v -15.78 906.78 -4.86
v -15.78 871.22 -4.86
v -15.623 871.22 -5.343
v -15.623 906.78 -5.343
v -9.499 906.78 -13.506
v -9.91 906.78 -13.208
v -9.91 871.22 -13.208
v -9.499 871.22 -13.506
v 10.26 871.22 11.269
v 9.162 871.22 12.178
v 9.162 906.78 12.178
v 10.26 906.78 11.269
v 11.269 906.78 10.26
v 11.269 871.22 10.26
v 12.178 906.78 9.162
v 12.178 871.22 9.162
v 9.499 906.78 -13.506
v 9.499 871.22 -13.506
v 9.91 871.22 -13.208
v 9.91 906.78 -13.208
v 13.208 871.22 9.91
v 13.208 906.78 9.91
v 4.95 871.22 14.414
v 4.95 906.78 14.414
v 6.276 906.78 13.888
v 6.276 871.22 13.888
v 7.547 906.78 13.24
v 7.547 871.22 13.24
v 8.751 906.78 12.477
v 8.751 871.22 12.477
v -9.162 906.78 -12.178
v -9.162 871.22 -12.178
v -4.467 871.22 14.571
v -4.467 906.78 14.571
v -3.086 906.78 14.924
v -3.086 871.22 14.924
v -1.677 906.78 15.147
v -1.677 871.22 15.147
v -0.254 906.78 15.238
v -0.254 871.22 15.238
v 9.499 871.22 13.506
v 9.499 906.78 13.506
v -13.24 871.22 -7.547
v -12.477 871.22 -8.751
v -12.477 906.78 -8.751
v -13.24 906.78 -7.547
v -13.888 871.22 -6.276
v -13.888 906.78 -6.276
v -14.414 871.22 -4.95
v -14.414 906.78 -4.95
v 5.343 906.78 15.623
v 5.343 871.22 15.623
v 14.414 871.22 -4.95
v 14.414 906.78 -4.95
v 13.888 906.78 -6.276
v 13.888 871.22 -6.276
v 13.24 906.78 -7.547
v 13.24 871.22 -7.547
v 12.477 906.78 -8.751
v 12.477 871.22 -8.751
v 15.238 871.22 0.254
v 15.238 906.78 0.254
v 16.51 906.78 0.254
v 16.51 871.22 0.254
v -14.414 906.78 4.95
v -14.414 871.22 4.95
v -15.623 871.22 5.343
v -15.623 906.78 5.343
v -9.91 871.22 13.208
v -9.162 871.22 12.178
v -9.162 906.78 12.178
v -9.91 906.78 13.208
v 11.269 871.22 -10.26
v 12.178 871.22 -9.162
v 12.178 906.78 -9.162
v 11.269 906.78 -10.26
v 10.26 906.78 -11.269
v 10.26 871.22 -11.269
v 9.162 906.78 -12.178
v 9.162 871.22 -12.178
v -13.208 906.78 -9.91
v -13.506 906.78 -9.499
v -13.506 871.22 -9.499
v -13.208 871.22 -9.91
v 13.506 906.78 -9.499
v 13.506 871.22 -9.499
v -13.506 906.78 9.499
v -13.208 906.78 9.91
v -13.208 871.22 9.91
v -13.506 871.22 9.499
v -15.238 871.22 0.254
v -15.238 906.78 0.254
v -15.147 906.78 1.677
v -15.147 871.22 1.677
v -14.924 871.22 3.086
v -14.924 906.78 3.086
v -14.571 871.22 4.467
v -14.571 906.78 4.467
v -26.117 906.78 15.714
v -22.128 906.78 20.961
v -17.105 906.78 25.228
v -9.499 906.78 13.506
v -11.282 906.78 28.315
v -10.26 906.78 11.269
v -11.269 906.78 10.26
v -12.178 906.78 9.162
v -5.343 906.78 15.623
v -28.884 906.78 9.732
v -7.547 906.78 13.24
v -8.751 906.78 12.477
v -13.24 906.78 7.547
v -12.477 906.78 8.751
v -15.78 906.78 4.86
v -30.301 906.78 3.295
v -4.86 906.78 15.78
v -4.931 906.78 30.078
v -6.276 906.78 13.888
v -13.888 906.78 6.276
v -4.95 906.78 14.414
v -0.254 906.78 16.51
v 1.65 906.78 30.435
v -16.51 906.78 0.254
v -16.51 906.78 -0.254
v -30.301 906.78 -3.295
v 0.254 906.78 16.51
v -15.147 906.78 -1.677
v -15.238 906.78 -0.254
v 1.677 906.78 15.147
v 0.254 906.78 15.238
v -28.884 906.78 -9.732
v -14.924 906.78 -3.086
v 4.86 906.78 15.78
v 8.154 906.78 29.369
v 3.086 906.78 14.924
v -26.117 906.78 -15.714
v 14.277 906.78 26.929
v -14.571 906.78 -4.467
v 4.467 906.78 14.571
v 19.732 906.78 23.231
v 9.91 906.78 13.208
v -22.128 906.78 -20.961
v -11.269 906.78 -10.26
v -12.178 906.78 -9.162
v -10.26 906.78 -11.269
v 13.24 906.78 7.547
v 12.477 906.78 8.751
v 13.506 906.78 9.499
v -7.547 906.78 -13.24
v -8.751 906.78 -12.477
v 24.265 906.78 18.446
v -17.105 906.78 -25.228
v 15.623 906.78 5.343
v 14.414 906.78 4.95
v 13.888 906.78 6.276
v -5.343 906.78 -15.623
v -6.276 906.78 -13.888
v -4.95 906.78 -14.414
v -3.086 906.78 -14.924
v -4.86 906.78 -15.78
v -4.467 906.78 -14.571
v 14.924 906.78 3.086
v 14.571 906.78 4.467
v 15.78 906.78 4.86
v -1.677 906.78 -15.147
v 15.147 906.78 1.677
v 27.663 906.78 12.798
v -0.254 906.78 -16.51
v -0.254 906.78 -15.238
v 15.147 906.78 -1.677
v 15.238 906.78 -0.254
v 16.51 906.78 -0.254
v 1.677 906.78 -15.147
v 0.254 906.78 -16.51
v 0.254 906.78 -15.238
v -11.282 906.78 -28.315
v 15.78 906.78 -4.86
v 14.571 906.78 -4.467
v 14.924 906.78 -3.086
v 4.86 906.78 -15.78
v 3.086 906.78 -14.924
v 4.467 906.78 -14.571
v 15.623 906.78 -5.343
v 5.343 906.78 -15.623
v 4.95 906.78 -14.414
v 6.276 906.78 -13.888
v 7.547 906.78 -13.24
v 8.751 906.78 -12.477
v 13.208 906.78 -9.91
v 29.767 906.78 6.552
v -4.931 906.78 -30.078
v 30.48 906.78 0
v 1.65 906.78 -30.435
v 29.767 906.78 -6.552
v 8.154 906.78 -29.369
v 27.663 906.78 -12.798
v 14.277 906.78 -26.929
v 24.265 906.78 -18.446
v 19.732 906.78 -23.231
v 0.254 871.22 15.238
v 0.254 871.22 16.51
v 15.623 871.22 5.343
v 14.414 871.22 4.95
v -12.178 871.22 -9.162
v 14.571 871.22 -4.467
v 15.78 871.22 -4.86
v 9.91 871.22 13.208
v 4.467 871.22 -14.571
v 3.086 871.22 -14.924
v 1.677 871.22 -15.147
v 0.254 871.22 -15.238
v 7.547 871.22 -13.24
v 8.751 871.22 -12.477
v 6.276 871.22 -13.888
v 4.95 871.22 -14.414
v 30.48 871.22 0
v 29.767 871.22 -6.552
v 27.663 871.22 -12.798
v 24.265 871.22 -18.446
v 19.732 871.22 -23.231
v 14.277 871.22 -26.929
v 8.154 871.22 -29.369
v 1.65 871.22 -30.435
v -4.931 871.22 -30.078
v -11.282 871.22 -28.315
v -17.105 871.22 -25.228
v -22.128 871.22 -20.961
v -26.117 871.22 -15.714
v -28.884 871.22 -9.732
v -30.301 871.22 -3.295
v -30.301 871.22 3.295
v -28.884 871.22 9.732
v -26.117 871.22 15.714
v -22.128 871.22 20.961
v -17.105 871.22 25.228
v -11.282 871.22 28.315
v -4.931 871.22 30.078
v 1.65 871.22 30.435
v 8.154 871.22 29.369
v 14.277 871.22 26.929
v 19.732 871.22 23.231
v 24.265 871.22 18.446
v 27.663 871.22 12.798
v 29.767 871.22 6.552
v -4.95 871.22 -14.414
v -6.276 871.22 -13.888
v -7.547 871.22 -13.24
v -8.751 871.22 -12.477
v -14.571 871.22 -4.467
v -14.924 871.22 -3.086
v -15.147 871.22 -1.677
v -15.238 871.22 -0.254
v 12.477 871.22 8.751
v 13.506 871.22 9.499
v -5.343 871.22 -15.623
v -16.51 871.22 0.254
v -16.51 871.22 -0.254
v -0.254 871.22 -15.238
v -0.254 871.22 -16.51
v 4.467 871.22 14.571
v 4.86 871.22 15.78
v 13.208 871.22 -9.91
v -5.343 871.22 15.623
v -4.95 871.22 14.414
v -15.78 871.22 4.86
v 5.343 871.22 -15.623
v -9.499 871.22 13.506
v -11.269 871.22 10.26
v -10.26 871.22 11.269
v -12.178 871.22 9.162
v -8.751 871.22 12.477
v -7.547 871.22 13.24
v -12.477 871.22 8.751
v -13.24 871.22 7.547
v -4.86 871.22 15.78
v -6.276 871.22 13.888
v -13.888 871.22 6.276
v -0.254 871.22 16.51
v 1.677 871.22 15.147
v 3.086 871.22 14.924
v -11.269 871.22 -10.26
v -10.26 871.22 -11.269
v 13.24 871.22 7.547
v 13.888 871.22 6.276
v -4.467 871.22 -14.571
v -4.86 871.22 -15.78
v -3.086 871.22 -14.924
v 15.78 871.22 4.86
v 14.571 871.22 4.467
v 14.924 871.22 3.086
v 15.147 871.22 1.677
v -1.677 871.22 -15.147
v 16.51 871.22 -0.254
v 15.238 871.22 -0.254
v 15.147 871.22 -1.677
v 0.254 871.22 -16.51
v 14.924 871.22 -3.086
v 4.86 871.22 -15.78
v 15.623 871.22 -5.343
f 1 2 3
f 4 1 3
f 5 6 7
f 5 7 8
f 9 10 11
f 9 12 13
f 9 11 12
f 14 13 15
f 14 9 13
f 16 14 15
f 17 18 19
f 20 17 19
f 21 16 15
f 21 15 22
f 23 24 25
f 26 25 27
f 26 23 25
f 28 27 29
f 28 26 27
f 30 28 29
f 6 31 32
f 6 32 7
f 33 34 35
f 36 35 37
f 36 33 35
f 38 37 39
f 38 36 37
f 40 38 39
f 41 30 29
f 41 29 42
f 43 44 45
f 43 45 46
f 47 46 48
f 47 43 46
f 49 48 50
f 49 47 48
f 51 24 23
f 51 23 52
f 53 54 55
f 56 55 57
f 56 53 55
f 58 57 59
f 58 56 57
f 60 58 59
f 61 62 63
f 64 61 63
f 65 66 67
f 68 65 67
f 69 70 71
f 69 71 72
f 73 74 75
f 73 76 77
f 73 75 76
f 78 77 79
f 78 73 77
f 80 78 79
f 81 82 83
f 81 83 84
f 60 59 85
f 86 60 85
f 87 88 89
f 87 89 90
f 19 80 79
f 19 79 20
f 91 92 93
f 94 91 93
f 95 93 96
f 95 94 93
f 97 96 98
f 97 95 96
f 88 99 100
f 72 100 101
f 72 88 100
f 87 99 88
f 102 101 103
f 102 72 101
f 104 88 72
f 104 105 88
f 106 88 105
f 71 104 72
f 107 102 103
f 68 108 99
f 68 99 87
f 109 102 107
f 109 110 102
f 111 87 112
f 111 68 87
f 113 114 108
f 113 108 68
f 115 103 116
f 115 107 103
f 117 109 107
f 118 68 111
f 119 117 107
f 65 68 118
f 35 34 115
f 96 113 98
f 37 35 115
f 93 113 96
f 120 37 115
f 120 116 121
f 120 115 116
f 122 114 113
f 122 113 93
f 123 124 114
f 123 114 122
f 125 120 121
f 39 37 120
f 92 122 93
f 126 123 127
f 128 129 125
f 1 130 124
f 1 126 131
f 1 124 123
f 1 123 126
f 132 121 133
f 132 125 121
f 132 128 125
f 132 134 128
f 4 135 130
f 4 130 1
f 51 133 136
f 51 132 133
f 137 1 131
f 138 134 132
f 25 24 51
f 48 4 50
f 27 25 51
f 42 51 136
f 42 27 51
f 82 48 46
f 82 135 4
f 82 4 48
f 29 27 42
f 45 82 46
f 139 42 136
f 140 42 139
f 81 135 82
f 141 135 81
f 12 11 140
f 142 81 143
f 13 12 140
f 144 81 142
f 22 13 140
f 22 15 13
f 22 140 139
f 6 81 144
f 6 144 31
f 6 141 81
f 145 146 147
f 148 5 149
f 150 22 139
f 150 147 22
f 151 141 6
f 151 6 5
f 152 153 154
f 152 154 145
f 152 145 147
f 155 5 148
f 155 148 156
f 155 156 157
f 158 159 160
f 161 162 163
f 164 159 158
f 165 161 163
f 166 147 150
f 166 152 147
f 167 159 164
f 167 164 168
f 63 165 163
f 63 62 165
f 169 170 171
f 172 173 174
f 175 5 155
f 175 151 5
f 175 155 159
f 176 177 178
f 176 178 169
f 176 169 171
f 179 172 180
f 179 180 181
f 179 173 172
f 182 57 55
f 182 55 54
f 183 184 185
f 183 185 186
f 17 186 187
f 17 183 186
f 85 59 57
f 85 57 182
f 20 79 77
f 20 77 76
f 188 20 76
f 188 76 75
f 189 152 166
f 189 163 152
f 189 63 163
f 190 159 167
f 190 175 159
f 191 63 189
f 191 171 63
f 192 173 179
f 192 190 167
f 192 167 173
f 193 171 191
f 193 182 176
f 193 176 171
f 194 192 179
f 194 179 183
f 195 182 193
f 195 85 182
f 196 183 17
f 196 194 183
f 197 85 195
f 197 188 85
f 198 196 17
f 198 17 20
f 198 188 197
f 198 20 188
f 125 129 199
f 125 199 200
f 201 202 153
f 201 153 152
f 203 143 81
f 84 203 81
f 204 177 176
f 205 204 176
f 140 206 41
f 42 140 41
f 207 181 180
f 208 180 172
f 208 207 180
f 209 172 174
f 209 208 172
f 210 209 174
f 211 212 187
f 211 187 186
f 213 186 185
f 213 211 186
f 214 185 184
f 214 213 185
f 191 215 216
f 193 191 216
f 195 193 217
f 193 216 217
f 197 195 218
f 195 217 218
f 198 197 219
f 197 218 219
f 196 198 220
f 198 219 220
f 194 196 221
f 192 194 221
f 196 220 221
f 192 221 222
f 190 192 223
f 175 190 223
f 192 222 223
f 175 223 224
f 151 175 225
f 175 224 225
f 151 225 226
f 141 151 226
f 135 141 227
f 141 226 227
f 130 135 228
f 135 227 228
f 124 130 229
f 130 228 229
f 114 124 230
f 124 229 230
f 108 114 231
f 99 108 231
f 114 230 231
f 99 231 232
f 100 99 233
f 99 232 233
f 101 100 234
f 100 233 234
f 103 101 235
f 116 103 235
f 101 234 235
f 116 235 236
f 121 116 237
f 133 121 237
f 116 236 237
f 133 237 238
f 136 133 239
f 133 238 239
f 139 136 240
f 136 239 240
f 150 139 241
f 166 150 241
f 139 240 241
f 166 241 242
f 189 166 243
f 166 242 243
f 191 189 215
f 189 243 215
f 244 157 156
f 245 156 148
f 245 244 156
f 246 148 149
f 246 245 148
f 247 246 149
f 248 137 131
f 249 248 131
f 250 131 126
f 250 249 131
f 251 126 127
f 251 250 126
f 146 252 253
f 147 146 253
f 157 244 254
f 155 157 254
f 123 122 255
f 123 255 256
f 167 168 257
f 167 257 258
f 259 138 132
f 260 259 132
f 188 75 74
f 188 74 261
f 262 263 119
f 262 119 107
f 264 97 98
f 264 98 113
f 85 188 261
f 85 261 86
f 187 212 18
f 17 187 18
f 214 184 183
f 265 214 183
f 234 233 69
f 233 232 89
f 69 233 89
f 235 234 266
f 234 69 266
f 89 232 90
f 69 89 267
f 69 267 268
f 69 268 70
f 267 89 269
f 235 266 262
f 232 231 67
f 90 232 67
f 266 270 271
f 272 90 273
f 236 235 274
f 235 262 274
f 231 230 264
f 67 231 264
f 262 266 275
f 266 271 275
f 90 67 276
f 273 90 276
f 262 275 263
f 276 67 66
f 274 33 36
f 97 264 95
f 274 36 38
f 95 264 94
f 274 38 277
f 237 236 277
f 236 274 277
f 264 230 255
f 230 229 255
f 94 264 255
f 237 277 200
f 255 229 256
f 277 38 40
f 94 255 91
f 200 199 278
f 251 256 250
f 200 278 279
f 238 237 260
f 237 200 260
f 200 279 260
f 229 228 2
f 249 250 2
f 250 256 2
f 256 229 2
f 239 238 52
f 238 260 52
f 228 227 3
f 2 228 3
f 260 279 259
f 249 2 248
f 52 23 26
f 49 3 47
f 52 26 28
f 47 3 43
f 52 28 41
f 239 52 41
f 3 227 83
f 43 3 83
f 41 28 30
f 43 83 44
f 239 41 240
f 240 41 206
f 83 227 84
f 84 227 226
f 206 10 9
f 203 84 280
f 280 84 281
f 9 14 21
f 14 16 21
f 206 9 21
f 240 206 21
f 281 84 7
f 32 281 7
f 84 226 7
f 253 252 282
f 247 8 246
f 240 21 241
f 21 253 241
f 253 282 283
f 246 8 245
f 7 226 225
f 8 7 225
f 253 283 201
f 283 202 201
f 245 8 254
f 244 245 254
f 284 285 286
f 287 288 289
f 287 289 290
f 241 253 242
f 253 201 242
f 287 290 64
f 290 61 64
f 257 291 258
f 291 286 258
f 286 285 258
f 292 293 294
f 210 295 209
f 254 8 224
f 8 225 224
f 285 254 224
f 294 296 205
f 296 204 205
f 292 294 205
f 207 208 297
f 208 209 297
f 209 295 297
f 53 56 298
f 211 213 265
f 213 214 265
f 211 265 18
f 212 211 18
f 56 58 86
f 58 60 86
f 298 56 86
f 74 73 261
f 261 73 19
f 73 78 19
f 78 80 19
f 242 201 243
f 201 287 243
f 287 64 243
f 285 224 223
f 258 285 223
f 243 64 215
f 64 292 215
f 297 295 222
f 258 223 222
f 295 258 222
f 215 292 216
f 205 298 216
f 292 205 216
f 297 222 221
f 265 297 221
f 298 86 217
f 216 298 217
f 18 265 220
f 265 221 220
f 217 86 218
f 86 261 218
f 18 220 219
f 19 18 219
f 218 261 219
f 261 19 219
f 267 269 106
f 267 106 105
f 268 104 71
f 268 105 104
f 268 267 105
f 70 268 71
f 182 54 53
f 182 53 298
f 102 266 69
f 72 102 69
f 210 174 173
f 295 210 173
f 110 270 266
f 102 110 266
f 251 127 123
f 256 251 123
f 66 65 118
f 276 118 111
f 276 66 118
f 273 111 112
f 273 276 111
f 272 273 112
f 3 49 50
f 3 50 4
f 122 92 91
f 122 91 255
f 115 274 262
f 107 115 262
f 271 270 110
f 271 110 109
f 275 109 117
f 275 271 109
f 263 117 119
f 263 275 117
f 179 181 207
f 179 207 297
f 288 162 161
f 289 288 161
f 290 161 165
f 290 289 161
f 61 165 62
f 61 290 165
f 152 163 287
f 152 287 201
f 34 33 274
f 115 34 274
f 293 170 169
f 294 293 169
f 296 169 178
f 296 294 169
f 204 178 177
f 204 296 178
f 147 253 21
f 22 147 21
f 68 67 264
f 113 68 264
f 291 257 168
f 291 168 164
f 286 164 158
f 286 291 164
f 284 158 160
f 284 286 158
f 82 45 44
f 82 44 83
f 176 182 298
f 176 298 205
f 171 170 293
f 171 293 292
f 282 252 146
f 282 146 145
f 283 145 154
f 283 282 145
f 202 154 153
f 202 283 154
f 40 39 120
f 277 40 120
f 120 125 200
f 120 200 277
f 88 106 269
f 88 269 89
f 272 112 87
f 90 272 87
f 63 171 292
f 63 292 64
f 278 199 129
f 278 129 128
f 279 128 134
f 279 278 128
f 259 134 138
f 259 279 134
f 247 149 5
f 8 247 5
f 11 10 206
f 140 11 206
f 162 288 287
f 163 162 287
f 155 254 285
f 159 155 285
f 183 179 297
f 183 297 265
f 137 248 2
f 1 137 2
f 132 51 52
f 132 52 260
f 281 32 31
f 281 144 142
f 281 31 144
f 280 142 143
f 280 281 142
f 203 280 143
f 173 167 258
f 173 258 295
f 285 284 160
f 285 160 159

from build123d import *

# Parameters (mm, degrees)
SKETCH1_R           = 1524
SKETCH1_R_2         = 762
EXTRUDE_THIN1_DEPTH = 1778
SKETCH2_W           = 25.4
SKETCH2_H           = 127
CUT_EXTRUDE1_DEPTH  = 2795
CIRPATTERN1_COUNT   = 20
SCALE1_SCALE        = 0.02


with BuildPart() as part:
    # Sketch1 → Extrude-Thin1 (new body)
    with BuildSketch(Plane(origin=(0, 0, 0), x_dir=(1, 0, 0), z_dir=(0, 1, 0))):
        Circle(SKETCH1_R)
        Circle(SKETCH1_R_2, mode=Mode.SUBTRACT)
    extrude(amount=EXTRUDE_THIN1_DEPTH)

    # Sketch2 → Cut-Extrude1 (cut, through all)
    with BuildSketch(Plane(origin=(0, 1778, 0), x_dir=(1, 0, 0), z_dir=(0, 1, 0))):
        with Locations((0, 762)):
            Rectangle(SKETCH2_W, SKETCH2_H)
    cut_extrude1 = extrude(amount=-CUT_EXTRUDE1_DEPTH, mode=Mode.SUBTRACT)

    # CirPattern1: Cut-Extrude1 ×20 about axis
    cirpattern1_axis = Axis((0, 0, 0), (0, 1, 0))
    for i in range(1, CIRPATTERN1_COUNT):
        add(cut_extrude1.rotate(cirpattern1_axis, i * 360 / CIRPATTERN1_COUNT), mode=Mode.SUBTRACT)


with BuildPart() as part_1:
    # Scale1: scaled about (0, 889, 0)
    add(part.part.scale(SCALE1_SCALE).moved(Location((0, 871.22, 0))))


solid = part_1.part
